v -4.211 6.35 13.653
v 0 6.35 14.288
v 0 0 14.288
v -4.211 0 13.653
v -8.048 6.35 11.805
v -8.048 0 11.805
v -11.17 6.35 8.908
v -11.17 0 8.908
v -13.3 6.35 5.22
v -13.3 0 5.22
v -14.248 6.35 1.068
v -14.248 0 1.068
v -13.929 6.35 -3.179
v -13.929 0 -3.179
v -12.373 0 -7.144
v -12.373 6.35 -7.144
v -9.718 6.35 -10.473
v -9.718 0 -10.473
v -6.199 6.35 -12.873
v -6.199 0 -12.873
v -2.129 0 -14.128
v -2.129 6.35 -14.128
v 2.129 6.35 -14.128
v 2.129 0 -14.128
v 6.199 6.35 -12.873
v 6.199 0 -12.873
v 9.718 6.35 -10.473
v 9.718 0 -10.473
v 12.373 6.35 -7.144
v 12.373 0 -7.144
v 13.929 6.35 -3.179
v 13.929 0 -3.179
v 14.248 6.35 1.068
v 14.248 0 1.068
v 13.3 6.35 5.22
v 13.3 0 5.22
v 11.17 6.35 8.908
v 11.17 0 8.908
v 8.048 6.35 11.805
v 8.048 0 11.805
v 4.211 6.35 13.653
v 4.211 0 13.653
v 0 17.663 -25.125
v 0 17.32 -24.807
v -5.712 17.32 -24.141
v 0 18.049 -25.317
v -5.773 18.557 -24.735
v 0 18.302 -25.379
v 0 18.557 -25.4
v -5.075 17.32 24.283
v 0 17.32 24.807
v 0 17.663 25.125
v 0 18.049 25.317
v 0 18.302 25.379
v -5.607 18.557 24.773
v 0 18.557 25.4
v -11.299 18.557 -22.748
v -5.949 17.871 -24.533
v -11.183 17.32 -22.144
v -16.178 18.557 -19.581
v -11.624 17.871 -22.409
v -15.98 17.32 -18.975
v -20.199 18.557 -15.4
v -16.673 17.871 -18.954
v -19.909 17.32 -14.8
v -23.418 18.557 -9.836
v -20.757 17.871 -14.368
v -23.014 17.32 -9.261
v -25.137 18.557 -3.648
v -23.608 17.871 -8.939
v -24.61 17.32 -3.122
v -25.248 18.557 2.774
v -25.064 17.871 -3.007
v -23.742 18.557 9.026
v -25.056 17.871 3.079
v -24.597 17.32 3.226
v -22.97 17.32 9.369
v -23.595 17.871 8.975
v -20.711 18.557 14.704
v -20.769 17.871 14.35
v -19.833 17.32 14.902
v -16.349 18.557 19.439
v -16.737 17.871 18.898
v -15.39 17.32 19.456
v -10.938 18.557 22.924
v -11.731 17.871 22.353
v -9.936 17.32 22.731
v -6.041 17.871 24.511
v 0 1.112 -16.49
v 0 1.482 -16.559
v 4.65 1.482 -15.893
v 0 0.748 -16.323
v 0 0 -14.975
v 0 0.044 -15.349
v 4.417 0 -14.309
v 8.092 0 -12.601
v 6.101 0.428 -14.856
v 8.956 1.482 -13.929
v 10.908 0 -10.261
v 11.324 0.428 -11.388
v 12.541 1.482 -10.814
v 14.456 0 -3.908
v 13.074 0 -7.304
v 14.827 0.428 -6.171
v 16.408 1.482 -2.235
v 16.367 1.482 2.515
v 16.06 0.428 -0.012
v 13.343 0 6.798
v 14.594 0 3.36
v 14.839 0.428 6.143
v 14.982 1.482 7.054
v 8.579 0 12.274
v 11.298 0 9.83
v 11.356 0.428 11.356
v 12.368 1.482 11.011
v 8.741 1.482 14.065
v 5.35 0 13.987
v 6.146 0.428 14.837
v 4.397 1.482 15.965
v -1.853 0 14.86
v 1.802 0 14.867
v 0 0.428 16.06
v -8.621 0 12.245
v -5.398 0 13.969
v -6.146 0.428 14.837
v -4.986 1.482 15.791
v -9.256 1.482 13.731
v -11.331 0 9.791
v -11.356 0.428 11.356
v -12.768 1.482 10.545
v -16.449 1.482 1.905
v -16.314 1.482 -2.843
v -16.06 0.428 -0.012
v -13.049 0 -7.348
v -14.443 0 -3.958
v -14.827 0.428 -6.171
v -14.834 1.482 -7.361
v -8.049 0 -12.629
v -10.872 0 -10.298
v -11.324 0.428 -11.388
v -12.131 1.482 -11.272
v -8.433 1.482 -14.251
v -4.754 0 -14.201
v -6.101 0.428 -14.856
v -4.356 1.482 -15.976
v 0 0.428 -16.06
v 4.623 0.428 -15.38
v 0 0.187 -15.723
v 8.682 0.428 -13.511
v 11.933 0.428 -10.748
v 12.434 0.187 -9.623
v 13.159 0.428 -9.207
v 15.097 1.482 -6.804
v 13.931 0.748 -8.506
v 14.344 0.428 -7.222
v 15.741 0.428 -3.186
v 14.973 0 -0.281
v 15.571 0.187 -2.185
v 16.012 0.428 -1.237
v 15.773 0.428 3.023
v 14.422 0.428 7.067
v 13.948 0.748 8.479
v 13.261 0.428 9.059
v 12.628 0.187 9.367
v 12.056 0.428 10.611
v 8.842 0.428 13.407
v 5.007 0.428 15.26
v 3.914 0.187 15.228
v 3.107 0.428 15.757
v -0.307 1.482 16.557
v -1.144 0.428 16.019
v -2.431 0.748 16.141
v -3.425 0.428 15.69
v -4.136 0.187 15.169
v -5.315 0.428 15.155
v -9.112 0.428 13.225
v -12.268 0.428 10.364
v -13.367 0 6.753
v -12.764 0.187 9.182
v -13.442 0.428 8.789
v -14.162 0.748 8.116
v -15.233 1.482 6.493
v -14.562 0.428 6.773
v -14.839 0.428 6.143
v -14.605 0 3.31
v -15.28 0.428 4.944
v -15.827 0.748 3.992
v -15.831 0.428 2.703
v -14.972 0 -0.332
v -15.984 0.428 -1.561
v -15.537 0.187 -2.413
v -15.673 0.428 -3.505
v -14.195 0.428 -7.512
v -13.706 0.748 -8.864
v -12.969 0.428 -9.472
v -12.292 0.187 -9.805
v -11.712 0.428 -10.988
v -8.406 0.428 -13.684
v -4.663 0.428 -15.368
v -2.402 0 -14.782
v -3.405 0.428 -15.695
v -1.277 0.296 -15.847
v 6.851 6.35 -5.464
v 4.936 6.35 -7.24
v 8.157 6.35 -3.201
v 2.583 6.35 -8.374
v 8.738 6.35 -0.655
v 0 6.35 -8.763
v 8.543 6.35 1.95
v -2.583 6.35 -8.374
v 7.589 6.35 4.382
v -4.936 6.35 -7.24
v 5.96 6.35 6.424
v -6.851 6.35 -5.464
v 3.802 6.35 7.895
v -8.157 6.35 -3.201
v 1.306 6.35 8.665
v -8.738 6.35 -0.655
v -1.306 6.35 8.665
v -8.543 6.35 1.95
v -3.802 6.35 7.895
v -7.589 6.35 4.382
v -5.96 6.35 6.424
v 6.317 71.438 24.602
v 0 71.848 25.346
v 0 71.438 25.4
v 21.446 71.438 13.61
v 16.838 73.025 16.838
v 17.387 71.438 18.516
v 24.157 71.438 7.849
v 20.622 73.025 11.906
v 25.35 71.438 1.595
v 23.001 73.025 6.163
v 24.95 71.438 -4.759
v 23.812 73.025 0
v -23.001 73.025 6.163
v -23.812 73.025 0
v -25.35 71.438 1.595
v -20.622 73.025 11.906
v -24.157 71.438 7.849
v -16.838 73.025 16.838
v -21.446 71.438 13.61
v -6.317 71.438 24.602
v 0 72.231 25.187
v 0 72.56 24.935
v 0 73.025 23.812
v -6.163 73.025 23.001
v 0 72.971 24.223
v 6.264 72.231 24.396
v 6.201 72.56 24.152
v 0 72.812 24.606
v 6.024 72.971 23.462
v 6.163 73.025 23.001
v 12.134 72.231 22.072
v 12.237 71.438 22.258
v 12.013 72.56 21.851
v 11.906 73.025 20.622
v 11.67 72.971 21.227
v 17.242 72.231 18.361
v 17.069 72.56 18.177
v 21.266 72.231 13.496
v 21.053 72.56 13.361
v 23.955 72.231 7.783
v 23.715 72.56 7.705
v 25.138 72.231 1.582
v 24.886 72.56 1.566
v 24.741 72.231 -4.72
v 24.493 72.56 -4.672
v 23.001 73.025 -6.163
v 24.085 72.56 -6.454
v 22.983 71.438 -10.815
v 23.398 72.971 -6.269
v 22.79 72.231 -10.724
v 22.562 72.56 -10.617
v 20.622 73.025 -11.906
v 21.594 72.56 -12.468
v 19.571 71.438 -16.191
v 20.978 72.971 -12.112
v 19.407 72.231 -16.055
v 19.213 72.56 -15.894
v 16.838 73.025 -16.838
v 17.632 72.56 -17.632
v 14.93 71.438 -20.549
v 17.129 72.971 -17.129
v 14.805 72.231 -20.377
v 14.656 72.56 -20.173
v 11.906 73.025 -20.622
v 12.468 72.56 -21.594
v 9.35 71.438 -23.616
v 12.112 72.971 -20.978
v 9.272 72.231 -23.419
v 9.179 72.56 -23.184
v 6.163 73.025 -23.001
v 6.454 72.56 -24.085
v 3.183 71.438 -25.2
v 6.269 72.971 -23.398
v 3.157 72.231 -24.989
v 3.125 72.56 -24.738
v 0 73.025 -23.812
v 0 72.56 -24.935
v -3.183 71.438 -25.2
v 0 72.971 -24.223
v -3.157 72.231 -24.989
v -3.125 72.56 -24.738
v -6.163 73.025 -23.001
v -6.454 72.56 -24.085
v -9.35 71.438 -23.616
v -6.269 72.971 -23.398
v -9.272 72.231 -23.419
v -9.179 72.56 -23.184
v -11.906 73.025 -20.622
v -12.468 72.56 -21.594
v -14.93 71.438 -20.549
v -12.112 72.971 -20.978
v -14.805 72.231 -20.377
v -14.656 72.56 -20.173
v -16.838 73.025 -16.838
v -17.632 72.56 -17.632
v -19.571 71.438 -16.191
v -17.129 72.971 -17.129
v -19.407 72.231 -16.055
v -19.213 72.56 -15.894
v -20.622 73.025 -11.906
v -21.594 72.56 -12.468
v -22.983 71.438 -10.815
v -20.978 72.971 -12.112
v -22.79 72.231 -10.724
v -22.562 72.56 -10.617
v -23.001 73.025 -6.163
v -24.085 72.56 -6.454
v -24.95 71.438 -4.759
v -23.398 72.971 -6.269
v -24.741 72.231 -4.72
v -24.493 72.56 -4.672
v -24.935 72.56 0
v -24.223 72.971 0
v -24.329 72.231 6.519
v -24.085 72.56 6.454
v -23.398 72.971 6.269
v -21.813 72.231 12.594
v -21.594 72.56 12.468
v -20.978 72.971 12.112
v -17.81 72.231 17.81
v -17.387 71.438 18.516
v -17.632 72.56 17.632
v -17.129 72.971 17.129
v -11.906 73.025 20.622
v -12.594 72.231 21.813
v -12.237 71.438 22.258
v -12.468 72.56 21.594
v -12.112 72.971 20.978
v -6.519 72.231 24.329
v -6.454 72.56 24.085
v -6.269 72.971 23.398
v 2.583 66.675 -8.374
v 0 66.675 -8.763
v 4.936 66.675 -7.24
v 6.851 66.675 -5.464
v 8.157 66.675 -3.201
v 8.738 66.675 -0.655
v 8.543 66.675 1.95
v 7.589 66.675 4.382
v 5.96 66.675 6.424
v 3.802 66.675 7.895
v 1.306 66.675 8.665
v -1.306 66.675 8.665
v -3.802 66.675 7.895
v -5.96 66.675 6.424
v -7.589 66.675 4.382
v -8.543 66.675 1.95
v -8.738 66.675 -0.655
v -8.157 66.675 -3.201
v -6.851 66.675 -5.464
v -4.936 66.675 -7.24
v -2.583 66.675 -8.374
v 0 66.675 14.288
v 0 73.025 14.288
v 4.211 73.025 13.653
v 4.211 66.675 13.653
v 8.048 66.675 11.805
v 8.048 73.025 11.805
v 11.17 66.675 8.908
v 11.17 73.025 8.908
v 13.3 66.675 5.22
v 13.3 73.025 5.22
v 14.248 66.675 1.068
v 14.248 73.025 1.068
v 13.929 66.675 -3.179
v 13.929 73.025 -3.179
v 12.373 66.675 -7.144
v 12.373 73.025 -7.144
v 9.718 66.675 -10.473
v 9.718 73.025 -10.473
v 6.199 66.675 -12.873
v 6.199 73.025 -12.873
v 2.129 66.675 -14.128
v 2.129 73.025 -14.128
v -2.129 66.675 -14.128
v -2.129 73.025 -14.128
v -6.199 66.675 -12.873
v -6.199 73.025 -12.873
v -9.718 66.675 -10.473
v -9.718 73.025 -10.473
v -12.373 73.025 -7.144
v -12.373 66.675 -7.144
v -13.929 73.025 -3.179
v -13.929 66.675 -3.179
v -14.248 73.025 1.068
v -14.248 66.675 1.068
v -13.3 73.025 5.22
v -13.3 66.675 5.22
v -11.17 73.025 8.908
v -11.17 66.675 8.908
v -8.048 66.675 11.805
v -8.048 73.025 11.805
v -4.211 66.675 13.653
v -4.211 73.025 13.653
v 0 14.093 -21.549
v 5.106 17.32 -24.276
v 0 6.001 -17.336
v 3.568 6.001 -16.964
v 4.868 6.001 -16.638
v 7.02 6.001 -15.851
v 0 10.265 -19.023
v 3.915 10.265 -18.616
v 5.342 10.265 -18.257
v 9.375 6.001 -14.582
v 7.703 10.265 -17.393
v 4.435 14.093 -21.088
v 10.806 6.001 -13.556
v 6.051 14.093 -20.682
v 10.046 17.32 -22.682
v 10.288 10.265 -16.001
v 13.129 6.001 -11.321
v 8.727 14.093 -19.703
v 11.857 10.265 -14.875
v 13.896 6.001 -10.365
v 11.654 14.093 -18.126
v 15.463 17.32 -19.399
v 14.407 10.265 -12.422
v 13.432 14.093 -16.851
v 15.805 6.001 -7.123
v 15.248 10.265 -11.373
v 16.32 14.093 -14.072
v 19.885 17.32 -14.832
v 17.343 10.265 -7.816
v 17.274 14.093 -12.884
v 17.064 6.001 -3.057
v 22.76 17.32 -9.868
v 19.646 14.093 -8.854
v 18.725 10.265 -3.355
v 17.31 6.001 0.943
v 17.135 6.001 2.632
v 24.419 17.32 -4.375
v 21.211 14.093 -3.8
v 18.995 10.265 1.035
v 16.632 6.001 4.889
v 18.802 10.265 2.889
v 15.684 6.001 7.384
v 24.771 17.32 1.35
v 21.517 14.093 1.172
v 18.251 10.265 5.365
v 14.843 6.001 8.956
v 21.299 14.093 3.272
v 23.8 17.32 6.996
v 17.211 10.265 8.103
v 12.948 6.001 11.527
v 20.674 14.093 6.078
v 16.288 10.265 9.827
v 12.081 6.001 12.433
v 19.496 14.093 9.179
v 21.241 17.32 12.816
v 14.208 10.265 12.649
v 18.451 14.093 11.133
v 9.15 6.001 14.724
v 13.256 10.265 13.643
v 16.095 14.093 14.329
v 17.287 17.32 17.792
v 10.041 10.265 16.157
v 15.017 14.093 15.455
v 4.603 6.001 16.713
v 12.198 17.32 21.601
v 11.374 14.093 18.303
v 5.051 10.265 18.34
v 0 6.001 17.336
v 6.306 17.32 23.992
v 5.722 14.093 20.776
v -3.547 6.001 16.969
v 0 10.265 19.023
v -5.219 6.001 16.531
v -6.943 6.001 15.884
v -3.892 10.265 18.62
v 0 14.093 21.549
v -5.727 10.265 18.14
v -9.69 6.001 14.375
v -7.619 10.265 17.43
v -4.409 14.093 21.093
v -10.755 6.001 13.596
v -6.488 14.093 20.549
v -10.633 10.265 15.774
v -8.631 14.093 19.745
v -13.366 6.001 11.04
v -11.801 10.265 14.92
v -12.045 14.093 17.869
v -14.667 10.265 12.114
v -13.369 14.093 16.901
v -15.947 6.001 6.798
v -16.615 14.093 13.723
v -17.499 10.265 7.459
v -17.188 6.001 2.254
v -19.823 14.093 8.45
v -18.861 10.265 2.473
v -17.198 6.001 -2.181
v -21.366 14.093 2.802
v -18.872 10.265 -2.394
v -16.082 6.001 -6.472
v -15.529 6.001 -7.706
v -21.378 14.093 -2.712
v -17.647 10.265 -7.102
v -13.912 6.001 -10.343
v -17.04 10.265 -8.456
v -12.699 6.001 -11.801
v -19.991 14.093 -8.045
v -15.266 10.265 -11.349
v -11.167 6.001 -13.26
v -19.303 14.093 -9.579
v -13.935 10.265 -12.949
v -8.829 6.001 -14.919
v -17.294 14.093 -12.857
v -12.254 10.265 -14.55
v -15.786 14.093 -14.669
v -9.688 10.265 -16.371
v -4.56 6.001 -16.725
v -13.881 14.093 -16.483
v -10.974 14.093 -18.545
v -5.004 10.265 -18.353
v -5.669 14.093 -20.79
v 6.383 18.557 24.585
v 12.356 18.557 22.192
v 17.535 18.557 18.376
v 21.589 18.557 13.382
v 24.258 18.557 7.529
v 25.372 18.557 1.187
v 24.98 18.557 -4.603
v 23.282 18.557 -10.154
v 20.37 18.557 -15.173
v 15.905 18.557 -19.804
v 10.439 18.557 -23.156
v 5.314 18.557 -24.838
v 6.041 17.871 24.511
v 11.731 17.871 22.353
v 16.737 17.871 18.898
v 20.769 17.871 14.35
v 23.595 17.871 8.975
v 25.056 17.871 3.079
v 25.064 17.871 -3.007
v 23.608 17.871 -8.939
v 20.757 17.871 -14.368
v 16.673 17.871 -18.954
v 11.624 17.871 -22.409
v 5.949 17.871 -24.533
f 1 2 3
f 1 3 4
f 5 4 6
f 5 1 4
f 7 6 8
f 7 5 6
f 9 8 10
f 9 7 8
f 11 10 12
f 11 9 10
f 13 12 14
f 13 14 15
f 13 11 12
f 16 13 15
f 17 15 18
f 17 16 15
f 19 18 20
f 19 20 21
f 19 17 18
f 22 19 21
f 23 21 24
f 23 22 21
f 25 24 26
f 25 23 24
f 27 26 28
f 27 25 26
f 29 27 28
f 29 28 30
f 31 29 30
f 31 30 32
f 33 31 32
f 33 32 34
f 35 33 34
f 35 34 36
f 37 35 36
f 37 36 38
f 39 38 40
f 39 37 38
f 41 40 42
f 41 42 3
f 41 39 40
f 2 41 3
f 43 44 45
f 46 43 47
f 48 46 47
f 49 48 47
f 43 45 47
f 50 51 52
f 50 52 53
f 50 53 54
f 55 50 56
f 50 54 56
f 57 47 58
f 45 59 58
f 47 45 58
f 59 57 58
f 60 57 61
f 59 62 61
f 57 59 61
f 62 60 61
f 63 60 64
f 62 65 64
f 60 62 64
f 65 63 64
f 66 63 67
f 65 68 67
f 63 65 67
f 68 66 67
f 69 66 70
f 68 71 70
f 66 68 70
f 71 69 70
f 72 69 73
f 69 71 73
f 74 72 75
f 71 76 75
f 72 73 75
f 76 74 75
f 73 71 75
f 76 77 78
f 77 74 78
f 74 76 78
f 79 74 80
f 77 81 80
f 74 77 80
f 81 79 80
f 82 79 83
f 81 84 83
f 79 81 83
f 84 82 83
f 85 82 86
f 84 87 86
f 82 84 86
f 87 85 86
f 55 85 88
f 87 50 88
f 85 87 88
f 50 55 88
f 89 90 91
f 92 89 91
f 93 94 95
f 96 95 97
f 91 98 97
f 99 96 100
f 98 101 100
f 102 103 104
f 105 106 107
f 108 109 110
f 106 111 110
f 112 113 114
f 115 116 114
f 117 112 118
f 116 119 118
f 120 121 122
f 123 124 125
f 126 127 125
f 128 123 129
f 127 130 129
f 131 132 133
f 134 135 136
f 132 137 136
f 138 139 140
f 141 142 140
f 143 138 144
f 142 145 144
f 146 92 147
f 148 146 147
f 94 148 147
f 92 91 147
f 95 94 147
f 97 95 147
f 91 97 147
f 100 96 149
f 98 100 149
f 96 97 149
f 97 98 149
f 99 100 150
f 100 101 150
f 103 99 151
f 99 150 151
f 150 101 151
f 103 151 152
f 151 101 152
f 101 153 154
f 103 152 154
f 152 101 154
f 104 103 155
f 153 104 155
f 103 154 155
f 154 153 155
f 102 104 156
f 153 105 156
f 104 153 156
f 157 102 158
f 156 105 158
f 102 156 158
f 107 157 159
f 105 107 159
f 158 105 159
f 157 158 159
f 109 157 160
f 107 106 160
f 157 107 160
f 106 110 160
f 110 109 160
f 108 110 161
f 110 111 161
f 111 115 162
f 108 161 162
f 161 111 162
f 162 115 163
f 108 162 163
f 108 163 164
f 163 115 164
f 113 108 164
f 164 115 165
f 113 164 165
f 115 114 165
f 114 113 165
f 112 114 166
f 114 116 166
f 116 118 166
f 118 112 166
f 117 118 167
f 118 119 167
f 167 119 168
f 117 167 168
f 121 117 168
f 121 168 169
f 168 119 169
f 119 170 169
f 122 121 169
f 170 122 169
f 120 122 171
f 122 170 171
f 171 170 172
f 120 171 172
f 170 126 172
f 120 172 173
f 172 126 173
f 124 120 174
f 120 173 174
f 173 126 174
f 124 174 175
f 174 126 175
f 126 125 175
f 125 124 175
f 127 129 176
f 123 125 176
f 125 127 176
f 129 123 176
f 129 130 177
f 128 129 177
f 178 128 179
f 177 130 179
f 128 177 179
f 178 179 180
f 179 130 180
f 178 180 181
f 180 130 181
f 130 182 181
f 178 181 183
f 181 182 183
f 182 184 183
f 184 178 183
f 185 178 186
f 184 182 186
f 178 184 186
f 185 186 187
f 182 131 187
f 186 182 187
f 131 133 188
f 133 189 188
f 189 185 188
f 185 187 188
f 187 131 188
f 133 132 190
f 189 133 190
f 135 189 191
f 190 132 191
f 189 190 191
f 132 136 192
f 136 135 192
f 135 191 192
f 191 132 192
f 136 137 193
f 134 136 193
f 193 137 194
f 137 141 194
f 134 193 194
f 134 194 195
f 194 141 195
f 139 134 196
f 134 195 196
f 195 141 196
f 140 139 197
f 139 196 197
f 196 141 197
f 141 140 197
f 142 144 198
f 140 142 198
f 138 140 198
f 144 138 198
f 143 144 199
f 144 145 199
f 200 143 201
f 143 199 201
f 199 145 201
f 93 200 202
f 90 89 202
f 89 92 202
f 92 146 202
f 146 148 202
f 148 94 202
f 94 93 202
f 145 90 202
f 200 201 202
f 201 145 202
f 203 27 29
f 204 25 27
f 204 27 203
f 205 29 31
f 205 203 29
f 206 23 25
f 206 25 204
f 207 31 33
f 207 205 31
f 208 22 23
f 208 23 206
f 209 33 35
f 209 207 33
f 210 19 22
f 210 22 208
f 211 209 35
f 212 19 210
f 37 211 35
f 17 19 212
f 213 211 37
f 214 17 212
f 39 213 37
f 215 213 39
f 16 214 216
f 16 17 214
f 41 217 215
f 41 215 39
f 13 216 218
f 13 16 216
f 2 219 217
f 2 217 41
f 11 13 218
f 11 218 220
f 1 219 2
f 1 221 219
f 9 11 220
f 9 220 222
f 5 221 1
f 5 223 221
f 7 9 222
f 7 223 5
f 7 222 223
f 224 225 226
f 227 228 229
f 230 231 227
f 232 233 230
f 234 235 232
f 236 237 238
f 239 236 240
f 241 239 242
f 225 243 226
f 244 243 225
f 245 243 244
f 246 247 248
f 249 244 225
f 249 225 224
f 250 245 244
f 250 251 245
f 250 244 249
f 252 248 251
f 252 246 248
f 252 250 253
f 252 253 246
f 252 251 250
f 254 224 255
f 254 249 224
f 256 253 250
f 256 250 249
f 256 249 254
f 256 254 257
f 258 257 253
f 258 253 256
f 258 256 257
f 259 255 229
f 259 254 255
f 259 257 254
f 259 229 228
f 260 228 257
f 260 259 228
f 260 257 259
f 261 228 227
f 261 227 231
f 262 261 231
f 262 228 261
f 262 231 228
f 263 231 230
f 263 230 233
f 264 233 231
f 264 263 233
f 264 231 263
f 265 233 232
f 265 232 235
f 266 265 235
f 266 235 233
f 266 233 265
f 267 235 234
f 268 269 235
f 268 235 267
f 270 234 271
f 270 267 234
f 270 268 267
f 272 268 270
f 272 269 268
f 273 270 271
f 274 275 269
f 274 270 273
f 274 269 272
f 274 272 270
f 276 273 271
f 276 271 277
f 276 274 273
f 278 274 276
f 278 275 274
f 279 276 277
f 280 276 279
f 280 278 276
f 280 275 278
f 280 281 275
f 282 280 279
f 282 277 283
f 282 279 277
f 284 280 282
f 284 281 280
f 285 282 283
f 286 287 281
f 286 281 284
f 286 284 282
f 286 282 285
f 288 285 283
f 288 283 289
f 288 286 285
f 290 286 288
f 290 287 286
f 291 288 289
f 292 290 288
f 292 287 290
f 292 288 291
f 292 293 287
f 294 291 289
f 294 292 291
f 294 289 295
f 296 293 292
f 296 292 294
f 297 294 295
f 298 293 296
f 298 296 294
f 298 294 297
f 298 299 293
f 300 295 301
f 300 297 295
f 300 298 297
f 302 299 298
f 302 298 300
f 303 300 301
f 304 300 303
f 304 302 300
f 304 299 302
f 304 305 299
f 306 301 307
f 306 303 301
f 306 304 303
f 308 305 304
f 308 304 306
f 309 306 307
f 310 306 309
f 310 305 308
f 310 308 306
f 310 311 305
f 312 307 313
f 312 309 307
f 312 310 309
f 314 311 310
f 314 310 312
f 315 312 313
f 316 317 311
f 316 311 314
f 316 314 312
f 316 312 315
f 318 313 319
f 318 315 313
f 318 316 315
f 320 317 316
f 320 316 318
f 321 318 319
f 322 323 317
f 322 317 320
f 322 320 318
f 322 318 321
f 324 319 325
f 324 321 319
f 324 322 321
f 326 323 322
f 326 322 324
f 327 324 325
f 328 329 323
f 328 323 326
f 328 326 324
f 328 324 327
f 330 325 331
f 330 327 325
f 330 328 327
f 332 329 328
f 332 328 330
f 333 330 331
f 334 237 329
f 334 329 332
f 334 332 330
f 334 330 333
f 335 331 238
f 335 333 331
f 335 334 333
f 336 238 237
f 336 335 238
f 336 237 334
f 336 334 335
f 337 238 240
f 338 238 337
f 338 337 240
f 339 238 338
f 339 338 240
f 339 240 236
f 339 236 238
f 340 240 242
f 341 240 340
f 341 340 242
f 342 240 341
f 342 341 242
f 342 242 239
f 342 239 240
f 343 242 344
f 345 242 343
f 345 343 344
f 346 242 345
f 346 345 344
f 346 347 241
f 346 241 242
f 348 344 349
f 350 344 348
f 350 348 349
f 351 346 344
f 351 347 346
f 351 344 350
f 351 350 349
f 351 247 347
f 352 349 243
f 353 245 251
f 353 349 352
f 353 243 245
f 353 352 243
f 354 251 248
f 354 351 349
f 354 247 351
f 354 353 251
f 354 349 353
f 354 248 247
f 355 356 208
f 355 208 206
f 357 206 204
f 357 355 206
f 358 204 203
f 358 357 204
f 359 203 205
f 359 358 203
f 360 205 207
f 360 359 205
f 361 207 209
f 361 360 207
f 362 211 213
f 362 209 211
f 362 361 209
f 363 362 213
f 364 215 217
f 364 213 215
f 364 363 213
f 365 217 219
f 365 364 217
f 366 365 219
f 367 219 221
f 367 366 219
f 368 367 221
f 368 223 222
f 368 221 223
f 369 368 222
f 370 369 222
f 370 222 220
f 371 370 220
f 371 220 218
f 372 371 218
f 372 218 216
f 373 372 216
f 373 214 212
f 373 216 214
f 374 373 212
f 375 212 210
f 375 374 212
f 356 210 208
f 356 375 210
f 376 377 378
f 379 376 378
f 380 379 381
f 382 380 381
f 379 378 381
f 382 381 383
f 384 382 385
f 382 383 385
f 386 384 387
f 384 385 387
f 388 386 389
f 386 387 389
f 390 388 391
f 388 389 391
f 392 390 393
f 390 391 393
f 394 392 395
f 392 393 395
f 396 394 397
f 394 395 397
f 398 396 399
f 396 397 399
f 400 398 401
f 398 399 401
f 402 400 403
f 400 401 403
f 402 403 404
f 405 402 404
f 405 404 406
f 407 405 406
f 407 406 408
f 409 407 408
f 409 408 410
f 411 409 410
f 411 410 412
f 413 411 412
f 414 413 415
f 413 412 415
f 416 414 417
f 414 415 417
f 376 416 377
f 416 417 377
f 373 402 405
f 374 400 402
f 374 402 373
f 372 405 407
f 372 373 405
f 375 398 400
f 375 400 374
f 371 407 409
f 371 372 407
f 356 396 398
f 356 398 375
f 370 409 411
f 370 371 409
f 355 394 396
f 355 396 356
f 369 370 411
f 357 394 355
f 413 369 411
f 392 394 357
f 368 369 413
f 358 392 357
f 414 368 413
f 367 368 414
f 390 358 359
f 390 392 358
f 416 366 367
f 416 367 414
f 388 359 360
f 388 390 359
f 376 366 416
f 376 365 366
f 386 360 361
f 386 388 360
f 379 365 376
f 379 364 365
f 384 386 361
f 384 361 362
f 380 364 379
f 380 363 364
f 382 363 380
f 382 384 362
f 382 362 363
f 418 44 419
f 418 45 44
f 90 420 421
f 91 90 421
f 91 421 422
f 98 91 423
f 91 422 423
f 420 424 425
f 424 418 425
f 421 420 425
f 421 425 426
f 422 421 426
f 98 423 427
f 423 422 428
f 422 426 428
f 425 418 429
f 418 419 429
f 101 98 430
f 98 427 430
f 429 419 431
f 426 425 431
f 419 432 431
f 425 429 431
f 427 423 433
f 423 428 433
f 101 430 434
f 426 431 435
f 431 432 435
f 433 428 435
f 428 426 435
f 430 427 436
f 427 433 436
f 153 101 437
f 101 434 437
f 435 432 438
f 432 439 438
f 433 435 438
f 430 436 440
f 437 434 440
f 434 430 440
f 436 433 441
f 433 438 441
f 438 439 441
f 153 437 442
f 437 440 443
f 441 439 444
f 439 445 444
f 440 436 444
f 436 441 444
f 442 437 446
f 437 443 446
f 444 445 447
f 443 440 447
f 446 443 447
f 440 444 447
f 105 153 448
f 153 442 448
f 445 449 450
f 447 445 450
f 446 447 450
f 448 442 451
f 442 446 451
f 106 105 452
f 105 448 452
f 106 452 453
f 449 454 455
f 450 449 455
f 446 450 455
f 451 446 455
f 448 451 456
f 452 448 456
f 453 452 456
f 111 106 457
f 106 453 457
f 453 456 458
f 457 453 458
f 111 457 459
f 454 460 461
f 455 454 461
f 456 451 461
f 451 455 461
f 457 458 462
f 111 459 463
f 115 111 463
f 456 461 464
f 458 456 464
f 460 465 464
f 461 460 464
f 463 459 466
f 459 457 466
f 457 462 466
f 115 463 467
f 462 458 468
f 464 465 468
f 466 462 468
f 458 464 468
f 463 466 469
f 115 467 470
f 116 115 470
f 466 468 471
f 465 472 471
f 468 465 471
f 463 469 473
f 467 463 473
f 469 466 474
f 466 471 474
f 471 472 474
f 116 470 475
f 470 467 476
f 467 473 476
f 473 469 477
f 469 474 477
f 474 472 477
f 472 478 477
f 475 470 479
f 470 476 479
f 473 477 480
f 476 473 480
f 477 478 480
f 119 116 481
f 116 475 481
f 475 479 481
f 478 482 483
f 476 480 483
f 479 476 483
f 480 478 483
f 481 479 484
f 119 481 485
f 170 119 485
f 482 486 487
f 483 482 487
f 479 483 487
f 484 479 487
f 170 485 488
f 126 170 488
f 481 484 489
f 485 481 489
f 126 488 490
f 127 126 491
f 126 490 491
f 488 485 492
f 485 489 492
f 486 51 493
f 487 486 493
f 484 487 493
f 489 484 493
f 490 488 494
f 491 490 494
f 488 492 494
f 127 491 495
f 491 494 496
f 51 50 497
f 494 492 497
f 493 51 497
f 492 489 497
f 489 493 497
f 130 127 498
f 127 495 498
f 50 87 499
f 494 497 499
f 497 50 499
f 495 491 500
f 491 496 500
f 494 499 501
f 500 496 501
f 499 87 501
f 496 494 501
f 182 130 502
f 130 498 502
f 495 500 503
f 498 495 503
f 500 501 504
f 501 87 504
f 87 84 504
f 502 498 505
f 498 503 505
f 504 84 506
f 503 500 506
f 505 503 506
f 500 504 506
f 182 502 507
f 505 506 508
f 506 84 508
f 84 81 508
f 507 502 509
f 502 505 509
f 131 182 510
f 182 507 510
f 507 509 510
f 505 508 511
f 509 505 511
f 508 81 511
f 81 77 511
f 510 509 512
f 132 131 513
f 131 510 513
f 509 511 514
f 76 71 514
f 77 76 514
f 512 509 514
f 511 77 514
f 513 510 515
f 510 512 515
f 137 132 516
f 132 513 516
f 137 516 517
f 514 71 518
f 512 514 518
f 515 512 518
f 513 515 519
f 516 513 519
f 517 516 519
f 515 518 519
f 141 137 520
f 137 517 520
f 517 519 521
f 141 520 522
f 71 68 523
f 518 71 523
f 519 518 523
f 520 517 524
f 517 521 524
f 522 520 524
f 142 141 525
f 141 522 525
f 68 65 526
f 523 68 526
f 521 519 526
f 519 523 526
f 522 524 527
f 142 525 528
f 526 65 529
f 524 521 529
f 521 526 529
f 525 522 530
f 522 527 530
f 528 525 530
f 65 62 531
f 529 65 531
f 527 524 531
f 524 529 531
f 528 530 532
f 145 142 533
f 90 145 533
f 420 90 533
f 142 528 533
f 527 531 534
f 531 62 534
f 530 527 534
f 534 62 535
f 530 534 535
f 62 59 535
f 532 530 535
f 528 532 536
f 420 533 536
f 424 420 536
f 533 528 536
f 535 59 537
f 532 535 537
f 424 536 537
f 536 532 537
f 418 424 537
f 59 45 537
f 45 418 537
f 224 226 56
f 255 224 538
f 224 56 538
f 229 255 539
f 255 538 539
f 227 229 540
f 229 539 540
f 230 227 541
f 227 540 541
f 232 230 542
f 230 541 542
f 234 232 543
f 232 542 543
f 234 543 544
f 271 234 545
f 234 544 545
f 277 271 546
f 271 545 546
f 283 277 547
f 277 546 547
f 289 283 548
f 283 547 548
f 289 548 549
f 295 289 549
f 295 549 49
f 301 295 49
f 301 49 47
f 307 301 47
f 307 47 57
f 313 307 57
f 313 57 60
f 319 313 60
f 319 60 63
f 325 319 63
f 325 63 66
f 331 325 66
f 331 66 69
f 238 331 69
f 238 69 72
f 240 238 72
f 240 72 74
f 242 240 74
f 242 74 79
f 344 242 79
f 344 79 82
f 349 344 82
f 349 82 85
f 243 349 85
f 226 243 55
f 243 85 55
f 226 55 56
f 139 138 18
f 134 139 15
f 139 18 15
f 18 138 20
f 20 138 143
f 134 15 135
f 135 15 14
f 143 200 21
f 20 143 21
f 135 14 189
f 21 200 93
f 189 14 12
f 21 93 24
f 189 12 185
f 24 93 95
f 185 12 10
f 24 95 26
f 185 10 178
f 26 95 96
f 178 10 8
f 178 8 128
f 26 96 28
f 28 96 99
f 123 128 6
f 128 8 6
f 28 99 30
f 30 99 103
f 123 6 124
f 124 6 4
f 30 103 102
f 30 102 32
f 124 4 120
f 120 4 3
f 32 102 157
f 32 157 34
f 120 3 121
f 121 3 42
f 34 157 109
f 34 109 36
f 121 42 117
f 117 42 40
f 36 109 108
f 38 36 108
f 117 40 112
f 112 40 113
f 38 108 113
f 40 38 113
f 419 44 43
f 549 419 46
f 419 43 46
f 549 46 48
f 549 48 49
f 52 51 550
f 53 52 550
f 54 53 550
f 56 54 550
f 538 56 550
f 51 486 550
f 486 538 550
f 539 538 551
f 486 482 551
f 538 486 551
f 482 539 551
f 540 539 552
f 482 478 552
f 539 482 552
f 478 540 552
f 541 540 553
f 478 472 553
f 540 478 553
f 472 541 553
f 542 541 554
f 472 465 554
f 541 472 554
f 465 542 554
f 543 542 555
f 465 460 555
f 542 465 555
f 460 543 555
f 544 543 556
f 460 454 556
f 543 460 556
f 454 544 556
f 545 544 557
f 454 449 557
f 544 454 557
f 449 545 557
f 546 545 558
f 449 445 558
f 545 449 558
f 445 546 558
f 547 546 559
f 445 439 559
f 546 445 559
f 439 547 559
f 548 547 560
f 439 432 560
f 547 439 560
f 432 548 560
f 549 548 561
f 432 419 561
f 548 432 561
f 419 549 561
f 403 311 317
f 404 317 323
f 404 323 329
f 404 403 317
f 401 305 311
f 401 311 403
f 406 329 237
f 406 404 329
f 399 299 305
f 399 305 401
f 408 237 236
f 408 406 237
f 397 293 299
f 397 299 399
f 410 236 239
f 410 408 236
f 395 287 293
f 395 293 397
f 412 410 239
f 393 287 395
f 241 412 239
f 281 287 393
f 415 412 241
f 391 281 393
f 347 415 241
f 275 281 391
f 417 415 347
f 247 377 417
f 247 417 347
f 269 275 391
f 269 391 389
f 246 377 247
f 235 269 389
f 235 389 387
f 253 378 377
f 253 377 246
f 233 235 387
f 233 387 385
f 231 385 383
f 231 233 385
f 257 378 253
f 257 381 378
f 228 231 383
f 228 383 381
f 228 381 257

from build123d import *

# Parameters (mm, degrees)
SKETCH1_R               = 25.4
BOSS_EXTRUDE1_DEPTH     = 73.025
SKETCH2_R               = 14.2875
CUT_EXTRUDE1_DEPTH      = 6.35
CUT_EXTRUDE2_START      = -6.35
SKETCH3_R               = 14.2875
CUT_EXTRUDE2_DEPTH      = 6.35
CUT_EXTRUDE3_DEPTH      = 76.735563806
CUT_EXTRUDE3_DEPTH_BACK = 76.735563806
SKETCH4_R               = 8.763
SKETCH5_R               = 25.4
SKETCH5_R_2             = 16.51
CUT_EXTRUDE5_DEPTH      = 17.78
FILLET8_R               = 1.5875


with BuildPart() as part:
    # Sketch1 → Boss-Extrude1 (new body)
    with BuildSketch(Plane(origin=(0, 0, 0), x_dir=(1, 0, 0), z_dir=(0, 1, 0))):
        with Locations(Location((0, 0, 0), (0, 0, 270))):
            Circle(SKETCH1_R)
    extrude(amount=BOSS_EXTRUDE1_DEPTH)

    # Sketch2 → Cut-Extrude1 (cut)
    with BuildSketch(Plane(origin=(0, 73.025, 0), x_dir=(1, 0, 0), z_dir=(0, 1, 0))):
        with Locations(Location((0, 0, 0), (0, 0, 270))):
            Circle(SKETCH2_R)
    extrude(amount=-CUT_EXTRUDE1_DEPTH, mode=Mode.SUBTRACT)

    # Sketch3 → Cut-Extrude2 (cut)
    with BuildSketch(Plane.XZ.offset(CUT_EXTRUDE2_START)):
        with Locations(Location((0, 0, 0), (0, 0, 90))):
            Circle(SKETCH3_R)
    extrude(amount=CUT_EXTRUDE2_DEPTH, mode=Mode.SUBTRACT)

    # Sketch4 → Cut-Extrude3 (cut, two sides: drawn at the far end of the back side and taken through both)
    with BuildSketch(Plane.XZ.offset(-6.35).offset(-CUT_EXTRUDE3_DEPTH_BACK)):
        with Locations(Location((0, 0, 0), (0, 0, 270))):
            Circle(SKETCH4_R)
    extrude(amount=CUT_EXTRUDE3_DEPTH + CUT_EXTRUDE3_DEPTH_BACK, mode=Mode.SUBTRACT)

    # Sketch5 → Cut-Extrude5 (cut)
    with BuildSketch(Plane(origin=(0, 0, 0), x_dir=(-1, 0, 0), z_dir=(0, -1, 0))):
        with Locations(Location((0, 0, 0), (0, 0, 90))):
            Circle(SKETCH5_R)
        with Locations(Location((0, 0, 0), (0, 0, 90))):
            Circle(SKETCH5_R_2, mode=Mode.SUBTRACT)
    extrude(amount=-CUT_EXTRUDE5_DEPTH, mode=Mode.SUBTRACT)

    # Sketch10 → Revolve3 (revolve)
    with BuildSketch(Plane.XY, mode=Mode.PRIVATE) as revolve3_sk:
        with BuildLine():
            Line((-25.4, 17.78), (-16.51, 17.78))
            Line((-16.51, 17.78), (-16.51, 0))
            ThreePointArc((-16.51, 0), (-18.85635568, 9.93932216), (-25.4, 17.78))
        make_face()
    revolve(revolve3_sk.sketch.rotate(Axis((0, 0, 0), (0, -1, 0)), 90), axis=Axis((0, 0, 0), (0, -1, 0)))

    # Fillet8
    fillet8_edges = [part.edges().sort_by_distance(p)[0] for p in [
        (25.4, 17.78, 0),
        (0, 0, 16.51),
        (0, 73.025, -25.4),
    ]]
    fillet(fillet8_edges, radius=FILLET8_R)


solid = part.part
